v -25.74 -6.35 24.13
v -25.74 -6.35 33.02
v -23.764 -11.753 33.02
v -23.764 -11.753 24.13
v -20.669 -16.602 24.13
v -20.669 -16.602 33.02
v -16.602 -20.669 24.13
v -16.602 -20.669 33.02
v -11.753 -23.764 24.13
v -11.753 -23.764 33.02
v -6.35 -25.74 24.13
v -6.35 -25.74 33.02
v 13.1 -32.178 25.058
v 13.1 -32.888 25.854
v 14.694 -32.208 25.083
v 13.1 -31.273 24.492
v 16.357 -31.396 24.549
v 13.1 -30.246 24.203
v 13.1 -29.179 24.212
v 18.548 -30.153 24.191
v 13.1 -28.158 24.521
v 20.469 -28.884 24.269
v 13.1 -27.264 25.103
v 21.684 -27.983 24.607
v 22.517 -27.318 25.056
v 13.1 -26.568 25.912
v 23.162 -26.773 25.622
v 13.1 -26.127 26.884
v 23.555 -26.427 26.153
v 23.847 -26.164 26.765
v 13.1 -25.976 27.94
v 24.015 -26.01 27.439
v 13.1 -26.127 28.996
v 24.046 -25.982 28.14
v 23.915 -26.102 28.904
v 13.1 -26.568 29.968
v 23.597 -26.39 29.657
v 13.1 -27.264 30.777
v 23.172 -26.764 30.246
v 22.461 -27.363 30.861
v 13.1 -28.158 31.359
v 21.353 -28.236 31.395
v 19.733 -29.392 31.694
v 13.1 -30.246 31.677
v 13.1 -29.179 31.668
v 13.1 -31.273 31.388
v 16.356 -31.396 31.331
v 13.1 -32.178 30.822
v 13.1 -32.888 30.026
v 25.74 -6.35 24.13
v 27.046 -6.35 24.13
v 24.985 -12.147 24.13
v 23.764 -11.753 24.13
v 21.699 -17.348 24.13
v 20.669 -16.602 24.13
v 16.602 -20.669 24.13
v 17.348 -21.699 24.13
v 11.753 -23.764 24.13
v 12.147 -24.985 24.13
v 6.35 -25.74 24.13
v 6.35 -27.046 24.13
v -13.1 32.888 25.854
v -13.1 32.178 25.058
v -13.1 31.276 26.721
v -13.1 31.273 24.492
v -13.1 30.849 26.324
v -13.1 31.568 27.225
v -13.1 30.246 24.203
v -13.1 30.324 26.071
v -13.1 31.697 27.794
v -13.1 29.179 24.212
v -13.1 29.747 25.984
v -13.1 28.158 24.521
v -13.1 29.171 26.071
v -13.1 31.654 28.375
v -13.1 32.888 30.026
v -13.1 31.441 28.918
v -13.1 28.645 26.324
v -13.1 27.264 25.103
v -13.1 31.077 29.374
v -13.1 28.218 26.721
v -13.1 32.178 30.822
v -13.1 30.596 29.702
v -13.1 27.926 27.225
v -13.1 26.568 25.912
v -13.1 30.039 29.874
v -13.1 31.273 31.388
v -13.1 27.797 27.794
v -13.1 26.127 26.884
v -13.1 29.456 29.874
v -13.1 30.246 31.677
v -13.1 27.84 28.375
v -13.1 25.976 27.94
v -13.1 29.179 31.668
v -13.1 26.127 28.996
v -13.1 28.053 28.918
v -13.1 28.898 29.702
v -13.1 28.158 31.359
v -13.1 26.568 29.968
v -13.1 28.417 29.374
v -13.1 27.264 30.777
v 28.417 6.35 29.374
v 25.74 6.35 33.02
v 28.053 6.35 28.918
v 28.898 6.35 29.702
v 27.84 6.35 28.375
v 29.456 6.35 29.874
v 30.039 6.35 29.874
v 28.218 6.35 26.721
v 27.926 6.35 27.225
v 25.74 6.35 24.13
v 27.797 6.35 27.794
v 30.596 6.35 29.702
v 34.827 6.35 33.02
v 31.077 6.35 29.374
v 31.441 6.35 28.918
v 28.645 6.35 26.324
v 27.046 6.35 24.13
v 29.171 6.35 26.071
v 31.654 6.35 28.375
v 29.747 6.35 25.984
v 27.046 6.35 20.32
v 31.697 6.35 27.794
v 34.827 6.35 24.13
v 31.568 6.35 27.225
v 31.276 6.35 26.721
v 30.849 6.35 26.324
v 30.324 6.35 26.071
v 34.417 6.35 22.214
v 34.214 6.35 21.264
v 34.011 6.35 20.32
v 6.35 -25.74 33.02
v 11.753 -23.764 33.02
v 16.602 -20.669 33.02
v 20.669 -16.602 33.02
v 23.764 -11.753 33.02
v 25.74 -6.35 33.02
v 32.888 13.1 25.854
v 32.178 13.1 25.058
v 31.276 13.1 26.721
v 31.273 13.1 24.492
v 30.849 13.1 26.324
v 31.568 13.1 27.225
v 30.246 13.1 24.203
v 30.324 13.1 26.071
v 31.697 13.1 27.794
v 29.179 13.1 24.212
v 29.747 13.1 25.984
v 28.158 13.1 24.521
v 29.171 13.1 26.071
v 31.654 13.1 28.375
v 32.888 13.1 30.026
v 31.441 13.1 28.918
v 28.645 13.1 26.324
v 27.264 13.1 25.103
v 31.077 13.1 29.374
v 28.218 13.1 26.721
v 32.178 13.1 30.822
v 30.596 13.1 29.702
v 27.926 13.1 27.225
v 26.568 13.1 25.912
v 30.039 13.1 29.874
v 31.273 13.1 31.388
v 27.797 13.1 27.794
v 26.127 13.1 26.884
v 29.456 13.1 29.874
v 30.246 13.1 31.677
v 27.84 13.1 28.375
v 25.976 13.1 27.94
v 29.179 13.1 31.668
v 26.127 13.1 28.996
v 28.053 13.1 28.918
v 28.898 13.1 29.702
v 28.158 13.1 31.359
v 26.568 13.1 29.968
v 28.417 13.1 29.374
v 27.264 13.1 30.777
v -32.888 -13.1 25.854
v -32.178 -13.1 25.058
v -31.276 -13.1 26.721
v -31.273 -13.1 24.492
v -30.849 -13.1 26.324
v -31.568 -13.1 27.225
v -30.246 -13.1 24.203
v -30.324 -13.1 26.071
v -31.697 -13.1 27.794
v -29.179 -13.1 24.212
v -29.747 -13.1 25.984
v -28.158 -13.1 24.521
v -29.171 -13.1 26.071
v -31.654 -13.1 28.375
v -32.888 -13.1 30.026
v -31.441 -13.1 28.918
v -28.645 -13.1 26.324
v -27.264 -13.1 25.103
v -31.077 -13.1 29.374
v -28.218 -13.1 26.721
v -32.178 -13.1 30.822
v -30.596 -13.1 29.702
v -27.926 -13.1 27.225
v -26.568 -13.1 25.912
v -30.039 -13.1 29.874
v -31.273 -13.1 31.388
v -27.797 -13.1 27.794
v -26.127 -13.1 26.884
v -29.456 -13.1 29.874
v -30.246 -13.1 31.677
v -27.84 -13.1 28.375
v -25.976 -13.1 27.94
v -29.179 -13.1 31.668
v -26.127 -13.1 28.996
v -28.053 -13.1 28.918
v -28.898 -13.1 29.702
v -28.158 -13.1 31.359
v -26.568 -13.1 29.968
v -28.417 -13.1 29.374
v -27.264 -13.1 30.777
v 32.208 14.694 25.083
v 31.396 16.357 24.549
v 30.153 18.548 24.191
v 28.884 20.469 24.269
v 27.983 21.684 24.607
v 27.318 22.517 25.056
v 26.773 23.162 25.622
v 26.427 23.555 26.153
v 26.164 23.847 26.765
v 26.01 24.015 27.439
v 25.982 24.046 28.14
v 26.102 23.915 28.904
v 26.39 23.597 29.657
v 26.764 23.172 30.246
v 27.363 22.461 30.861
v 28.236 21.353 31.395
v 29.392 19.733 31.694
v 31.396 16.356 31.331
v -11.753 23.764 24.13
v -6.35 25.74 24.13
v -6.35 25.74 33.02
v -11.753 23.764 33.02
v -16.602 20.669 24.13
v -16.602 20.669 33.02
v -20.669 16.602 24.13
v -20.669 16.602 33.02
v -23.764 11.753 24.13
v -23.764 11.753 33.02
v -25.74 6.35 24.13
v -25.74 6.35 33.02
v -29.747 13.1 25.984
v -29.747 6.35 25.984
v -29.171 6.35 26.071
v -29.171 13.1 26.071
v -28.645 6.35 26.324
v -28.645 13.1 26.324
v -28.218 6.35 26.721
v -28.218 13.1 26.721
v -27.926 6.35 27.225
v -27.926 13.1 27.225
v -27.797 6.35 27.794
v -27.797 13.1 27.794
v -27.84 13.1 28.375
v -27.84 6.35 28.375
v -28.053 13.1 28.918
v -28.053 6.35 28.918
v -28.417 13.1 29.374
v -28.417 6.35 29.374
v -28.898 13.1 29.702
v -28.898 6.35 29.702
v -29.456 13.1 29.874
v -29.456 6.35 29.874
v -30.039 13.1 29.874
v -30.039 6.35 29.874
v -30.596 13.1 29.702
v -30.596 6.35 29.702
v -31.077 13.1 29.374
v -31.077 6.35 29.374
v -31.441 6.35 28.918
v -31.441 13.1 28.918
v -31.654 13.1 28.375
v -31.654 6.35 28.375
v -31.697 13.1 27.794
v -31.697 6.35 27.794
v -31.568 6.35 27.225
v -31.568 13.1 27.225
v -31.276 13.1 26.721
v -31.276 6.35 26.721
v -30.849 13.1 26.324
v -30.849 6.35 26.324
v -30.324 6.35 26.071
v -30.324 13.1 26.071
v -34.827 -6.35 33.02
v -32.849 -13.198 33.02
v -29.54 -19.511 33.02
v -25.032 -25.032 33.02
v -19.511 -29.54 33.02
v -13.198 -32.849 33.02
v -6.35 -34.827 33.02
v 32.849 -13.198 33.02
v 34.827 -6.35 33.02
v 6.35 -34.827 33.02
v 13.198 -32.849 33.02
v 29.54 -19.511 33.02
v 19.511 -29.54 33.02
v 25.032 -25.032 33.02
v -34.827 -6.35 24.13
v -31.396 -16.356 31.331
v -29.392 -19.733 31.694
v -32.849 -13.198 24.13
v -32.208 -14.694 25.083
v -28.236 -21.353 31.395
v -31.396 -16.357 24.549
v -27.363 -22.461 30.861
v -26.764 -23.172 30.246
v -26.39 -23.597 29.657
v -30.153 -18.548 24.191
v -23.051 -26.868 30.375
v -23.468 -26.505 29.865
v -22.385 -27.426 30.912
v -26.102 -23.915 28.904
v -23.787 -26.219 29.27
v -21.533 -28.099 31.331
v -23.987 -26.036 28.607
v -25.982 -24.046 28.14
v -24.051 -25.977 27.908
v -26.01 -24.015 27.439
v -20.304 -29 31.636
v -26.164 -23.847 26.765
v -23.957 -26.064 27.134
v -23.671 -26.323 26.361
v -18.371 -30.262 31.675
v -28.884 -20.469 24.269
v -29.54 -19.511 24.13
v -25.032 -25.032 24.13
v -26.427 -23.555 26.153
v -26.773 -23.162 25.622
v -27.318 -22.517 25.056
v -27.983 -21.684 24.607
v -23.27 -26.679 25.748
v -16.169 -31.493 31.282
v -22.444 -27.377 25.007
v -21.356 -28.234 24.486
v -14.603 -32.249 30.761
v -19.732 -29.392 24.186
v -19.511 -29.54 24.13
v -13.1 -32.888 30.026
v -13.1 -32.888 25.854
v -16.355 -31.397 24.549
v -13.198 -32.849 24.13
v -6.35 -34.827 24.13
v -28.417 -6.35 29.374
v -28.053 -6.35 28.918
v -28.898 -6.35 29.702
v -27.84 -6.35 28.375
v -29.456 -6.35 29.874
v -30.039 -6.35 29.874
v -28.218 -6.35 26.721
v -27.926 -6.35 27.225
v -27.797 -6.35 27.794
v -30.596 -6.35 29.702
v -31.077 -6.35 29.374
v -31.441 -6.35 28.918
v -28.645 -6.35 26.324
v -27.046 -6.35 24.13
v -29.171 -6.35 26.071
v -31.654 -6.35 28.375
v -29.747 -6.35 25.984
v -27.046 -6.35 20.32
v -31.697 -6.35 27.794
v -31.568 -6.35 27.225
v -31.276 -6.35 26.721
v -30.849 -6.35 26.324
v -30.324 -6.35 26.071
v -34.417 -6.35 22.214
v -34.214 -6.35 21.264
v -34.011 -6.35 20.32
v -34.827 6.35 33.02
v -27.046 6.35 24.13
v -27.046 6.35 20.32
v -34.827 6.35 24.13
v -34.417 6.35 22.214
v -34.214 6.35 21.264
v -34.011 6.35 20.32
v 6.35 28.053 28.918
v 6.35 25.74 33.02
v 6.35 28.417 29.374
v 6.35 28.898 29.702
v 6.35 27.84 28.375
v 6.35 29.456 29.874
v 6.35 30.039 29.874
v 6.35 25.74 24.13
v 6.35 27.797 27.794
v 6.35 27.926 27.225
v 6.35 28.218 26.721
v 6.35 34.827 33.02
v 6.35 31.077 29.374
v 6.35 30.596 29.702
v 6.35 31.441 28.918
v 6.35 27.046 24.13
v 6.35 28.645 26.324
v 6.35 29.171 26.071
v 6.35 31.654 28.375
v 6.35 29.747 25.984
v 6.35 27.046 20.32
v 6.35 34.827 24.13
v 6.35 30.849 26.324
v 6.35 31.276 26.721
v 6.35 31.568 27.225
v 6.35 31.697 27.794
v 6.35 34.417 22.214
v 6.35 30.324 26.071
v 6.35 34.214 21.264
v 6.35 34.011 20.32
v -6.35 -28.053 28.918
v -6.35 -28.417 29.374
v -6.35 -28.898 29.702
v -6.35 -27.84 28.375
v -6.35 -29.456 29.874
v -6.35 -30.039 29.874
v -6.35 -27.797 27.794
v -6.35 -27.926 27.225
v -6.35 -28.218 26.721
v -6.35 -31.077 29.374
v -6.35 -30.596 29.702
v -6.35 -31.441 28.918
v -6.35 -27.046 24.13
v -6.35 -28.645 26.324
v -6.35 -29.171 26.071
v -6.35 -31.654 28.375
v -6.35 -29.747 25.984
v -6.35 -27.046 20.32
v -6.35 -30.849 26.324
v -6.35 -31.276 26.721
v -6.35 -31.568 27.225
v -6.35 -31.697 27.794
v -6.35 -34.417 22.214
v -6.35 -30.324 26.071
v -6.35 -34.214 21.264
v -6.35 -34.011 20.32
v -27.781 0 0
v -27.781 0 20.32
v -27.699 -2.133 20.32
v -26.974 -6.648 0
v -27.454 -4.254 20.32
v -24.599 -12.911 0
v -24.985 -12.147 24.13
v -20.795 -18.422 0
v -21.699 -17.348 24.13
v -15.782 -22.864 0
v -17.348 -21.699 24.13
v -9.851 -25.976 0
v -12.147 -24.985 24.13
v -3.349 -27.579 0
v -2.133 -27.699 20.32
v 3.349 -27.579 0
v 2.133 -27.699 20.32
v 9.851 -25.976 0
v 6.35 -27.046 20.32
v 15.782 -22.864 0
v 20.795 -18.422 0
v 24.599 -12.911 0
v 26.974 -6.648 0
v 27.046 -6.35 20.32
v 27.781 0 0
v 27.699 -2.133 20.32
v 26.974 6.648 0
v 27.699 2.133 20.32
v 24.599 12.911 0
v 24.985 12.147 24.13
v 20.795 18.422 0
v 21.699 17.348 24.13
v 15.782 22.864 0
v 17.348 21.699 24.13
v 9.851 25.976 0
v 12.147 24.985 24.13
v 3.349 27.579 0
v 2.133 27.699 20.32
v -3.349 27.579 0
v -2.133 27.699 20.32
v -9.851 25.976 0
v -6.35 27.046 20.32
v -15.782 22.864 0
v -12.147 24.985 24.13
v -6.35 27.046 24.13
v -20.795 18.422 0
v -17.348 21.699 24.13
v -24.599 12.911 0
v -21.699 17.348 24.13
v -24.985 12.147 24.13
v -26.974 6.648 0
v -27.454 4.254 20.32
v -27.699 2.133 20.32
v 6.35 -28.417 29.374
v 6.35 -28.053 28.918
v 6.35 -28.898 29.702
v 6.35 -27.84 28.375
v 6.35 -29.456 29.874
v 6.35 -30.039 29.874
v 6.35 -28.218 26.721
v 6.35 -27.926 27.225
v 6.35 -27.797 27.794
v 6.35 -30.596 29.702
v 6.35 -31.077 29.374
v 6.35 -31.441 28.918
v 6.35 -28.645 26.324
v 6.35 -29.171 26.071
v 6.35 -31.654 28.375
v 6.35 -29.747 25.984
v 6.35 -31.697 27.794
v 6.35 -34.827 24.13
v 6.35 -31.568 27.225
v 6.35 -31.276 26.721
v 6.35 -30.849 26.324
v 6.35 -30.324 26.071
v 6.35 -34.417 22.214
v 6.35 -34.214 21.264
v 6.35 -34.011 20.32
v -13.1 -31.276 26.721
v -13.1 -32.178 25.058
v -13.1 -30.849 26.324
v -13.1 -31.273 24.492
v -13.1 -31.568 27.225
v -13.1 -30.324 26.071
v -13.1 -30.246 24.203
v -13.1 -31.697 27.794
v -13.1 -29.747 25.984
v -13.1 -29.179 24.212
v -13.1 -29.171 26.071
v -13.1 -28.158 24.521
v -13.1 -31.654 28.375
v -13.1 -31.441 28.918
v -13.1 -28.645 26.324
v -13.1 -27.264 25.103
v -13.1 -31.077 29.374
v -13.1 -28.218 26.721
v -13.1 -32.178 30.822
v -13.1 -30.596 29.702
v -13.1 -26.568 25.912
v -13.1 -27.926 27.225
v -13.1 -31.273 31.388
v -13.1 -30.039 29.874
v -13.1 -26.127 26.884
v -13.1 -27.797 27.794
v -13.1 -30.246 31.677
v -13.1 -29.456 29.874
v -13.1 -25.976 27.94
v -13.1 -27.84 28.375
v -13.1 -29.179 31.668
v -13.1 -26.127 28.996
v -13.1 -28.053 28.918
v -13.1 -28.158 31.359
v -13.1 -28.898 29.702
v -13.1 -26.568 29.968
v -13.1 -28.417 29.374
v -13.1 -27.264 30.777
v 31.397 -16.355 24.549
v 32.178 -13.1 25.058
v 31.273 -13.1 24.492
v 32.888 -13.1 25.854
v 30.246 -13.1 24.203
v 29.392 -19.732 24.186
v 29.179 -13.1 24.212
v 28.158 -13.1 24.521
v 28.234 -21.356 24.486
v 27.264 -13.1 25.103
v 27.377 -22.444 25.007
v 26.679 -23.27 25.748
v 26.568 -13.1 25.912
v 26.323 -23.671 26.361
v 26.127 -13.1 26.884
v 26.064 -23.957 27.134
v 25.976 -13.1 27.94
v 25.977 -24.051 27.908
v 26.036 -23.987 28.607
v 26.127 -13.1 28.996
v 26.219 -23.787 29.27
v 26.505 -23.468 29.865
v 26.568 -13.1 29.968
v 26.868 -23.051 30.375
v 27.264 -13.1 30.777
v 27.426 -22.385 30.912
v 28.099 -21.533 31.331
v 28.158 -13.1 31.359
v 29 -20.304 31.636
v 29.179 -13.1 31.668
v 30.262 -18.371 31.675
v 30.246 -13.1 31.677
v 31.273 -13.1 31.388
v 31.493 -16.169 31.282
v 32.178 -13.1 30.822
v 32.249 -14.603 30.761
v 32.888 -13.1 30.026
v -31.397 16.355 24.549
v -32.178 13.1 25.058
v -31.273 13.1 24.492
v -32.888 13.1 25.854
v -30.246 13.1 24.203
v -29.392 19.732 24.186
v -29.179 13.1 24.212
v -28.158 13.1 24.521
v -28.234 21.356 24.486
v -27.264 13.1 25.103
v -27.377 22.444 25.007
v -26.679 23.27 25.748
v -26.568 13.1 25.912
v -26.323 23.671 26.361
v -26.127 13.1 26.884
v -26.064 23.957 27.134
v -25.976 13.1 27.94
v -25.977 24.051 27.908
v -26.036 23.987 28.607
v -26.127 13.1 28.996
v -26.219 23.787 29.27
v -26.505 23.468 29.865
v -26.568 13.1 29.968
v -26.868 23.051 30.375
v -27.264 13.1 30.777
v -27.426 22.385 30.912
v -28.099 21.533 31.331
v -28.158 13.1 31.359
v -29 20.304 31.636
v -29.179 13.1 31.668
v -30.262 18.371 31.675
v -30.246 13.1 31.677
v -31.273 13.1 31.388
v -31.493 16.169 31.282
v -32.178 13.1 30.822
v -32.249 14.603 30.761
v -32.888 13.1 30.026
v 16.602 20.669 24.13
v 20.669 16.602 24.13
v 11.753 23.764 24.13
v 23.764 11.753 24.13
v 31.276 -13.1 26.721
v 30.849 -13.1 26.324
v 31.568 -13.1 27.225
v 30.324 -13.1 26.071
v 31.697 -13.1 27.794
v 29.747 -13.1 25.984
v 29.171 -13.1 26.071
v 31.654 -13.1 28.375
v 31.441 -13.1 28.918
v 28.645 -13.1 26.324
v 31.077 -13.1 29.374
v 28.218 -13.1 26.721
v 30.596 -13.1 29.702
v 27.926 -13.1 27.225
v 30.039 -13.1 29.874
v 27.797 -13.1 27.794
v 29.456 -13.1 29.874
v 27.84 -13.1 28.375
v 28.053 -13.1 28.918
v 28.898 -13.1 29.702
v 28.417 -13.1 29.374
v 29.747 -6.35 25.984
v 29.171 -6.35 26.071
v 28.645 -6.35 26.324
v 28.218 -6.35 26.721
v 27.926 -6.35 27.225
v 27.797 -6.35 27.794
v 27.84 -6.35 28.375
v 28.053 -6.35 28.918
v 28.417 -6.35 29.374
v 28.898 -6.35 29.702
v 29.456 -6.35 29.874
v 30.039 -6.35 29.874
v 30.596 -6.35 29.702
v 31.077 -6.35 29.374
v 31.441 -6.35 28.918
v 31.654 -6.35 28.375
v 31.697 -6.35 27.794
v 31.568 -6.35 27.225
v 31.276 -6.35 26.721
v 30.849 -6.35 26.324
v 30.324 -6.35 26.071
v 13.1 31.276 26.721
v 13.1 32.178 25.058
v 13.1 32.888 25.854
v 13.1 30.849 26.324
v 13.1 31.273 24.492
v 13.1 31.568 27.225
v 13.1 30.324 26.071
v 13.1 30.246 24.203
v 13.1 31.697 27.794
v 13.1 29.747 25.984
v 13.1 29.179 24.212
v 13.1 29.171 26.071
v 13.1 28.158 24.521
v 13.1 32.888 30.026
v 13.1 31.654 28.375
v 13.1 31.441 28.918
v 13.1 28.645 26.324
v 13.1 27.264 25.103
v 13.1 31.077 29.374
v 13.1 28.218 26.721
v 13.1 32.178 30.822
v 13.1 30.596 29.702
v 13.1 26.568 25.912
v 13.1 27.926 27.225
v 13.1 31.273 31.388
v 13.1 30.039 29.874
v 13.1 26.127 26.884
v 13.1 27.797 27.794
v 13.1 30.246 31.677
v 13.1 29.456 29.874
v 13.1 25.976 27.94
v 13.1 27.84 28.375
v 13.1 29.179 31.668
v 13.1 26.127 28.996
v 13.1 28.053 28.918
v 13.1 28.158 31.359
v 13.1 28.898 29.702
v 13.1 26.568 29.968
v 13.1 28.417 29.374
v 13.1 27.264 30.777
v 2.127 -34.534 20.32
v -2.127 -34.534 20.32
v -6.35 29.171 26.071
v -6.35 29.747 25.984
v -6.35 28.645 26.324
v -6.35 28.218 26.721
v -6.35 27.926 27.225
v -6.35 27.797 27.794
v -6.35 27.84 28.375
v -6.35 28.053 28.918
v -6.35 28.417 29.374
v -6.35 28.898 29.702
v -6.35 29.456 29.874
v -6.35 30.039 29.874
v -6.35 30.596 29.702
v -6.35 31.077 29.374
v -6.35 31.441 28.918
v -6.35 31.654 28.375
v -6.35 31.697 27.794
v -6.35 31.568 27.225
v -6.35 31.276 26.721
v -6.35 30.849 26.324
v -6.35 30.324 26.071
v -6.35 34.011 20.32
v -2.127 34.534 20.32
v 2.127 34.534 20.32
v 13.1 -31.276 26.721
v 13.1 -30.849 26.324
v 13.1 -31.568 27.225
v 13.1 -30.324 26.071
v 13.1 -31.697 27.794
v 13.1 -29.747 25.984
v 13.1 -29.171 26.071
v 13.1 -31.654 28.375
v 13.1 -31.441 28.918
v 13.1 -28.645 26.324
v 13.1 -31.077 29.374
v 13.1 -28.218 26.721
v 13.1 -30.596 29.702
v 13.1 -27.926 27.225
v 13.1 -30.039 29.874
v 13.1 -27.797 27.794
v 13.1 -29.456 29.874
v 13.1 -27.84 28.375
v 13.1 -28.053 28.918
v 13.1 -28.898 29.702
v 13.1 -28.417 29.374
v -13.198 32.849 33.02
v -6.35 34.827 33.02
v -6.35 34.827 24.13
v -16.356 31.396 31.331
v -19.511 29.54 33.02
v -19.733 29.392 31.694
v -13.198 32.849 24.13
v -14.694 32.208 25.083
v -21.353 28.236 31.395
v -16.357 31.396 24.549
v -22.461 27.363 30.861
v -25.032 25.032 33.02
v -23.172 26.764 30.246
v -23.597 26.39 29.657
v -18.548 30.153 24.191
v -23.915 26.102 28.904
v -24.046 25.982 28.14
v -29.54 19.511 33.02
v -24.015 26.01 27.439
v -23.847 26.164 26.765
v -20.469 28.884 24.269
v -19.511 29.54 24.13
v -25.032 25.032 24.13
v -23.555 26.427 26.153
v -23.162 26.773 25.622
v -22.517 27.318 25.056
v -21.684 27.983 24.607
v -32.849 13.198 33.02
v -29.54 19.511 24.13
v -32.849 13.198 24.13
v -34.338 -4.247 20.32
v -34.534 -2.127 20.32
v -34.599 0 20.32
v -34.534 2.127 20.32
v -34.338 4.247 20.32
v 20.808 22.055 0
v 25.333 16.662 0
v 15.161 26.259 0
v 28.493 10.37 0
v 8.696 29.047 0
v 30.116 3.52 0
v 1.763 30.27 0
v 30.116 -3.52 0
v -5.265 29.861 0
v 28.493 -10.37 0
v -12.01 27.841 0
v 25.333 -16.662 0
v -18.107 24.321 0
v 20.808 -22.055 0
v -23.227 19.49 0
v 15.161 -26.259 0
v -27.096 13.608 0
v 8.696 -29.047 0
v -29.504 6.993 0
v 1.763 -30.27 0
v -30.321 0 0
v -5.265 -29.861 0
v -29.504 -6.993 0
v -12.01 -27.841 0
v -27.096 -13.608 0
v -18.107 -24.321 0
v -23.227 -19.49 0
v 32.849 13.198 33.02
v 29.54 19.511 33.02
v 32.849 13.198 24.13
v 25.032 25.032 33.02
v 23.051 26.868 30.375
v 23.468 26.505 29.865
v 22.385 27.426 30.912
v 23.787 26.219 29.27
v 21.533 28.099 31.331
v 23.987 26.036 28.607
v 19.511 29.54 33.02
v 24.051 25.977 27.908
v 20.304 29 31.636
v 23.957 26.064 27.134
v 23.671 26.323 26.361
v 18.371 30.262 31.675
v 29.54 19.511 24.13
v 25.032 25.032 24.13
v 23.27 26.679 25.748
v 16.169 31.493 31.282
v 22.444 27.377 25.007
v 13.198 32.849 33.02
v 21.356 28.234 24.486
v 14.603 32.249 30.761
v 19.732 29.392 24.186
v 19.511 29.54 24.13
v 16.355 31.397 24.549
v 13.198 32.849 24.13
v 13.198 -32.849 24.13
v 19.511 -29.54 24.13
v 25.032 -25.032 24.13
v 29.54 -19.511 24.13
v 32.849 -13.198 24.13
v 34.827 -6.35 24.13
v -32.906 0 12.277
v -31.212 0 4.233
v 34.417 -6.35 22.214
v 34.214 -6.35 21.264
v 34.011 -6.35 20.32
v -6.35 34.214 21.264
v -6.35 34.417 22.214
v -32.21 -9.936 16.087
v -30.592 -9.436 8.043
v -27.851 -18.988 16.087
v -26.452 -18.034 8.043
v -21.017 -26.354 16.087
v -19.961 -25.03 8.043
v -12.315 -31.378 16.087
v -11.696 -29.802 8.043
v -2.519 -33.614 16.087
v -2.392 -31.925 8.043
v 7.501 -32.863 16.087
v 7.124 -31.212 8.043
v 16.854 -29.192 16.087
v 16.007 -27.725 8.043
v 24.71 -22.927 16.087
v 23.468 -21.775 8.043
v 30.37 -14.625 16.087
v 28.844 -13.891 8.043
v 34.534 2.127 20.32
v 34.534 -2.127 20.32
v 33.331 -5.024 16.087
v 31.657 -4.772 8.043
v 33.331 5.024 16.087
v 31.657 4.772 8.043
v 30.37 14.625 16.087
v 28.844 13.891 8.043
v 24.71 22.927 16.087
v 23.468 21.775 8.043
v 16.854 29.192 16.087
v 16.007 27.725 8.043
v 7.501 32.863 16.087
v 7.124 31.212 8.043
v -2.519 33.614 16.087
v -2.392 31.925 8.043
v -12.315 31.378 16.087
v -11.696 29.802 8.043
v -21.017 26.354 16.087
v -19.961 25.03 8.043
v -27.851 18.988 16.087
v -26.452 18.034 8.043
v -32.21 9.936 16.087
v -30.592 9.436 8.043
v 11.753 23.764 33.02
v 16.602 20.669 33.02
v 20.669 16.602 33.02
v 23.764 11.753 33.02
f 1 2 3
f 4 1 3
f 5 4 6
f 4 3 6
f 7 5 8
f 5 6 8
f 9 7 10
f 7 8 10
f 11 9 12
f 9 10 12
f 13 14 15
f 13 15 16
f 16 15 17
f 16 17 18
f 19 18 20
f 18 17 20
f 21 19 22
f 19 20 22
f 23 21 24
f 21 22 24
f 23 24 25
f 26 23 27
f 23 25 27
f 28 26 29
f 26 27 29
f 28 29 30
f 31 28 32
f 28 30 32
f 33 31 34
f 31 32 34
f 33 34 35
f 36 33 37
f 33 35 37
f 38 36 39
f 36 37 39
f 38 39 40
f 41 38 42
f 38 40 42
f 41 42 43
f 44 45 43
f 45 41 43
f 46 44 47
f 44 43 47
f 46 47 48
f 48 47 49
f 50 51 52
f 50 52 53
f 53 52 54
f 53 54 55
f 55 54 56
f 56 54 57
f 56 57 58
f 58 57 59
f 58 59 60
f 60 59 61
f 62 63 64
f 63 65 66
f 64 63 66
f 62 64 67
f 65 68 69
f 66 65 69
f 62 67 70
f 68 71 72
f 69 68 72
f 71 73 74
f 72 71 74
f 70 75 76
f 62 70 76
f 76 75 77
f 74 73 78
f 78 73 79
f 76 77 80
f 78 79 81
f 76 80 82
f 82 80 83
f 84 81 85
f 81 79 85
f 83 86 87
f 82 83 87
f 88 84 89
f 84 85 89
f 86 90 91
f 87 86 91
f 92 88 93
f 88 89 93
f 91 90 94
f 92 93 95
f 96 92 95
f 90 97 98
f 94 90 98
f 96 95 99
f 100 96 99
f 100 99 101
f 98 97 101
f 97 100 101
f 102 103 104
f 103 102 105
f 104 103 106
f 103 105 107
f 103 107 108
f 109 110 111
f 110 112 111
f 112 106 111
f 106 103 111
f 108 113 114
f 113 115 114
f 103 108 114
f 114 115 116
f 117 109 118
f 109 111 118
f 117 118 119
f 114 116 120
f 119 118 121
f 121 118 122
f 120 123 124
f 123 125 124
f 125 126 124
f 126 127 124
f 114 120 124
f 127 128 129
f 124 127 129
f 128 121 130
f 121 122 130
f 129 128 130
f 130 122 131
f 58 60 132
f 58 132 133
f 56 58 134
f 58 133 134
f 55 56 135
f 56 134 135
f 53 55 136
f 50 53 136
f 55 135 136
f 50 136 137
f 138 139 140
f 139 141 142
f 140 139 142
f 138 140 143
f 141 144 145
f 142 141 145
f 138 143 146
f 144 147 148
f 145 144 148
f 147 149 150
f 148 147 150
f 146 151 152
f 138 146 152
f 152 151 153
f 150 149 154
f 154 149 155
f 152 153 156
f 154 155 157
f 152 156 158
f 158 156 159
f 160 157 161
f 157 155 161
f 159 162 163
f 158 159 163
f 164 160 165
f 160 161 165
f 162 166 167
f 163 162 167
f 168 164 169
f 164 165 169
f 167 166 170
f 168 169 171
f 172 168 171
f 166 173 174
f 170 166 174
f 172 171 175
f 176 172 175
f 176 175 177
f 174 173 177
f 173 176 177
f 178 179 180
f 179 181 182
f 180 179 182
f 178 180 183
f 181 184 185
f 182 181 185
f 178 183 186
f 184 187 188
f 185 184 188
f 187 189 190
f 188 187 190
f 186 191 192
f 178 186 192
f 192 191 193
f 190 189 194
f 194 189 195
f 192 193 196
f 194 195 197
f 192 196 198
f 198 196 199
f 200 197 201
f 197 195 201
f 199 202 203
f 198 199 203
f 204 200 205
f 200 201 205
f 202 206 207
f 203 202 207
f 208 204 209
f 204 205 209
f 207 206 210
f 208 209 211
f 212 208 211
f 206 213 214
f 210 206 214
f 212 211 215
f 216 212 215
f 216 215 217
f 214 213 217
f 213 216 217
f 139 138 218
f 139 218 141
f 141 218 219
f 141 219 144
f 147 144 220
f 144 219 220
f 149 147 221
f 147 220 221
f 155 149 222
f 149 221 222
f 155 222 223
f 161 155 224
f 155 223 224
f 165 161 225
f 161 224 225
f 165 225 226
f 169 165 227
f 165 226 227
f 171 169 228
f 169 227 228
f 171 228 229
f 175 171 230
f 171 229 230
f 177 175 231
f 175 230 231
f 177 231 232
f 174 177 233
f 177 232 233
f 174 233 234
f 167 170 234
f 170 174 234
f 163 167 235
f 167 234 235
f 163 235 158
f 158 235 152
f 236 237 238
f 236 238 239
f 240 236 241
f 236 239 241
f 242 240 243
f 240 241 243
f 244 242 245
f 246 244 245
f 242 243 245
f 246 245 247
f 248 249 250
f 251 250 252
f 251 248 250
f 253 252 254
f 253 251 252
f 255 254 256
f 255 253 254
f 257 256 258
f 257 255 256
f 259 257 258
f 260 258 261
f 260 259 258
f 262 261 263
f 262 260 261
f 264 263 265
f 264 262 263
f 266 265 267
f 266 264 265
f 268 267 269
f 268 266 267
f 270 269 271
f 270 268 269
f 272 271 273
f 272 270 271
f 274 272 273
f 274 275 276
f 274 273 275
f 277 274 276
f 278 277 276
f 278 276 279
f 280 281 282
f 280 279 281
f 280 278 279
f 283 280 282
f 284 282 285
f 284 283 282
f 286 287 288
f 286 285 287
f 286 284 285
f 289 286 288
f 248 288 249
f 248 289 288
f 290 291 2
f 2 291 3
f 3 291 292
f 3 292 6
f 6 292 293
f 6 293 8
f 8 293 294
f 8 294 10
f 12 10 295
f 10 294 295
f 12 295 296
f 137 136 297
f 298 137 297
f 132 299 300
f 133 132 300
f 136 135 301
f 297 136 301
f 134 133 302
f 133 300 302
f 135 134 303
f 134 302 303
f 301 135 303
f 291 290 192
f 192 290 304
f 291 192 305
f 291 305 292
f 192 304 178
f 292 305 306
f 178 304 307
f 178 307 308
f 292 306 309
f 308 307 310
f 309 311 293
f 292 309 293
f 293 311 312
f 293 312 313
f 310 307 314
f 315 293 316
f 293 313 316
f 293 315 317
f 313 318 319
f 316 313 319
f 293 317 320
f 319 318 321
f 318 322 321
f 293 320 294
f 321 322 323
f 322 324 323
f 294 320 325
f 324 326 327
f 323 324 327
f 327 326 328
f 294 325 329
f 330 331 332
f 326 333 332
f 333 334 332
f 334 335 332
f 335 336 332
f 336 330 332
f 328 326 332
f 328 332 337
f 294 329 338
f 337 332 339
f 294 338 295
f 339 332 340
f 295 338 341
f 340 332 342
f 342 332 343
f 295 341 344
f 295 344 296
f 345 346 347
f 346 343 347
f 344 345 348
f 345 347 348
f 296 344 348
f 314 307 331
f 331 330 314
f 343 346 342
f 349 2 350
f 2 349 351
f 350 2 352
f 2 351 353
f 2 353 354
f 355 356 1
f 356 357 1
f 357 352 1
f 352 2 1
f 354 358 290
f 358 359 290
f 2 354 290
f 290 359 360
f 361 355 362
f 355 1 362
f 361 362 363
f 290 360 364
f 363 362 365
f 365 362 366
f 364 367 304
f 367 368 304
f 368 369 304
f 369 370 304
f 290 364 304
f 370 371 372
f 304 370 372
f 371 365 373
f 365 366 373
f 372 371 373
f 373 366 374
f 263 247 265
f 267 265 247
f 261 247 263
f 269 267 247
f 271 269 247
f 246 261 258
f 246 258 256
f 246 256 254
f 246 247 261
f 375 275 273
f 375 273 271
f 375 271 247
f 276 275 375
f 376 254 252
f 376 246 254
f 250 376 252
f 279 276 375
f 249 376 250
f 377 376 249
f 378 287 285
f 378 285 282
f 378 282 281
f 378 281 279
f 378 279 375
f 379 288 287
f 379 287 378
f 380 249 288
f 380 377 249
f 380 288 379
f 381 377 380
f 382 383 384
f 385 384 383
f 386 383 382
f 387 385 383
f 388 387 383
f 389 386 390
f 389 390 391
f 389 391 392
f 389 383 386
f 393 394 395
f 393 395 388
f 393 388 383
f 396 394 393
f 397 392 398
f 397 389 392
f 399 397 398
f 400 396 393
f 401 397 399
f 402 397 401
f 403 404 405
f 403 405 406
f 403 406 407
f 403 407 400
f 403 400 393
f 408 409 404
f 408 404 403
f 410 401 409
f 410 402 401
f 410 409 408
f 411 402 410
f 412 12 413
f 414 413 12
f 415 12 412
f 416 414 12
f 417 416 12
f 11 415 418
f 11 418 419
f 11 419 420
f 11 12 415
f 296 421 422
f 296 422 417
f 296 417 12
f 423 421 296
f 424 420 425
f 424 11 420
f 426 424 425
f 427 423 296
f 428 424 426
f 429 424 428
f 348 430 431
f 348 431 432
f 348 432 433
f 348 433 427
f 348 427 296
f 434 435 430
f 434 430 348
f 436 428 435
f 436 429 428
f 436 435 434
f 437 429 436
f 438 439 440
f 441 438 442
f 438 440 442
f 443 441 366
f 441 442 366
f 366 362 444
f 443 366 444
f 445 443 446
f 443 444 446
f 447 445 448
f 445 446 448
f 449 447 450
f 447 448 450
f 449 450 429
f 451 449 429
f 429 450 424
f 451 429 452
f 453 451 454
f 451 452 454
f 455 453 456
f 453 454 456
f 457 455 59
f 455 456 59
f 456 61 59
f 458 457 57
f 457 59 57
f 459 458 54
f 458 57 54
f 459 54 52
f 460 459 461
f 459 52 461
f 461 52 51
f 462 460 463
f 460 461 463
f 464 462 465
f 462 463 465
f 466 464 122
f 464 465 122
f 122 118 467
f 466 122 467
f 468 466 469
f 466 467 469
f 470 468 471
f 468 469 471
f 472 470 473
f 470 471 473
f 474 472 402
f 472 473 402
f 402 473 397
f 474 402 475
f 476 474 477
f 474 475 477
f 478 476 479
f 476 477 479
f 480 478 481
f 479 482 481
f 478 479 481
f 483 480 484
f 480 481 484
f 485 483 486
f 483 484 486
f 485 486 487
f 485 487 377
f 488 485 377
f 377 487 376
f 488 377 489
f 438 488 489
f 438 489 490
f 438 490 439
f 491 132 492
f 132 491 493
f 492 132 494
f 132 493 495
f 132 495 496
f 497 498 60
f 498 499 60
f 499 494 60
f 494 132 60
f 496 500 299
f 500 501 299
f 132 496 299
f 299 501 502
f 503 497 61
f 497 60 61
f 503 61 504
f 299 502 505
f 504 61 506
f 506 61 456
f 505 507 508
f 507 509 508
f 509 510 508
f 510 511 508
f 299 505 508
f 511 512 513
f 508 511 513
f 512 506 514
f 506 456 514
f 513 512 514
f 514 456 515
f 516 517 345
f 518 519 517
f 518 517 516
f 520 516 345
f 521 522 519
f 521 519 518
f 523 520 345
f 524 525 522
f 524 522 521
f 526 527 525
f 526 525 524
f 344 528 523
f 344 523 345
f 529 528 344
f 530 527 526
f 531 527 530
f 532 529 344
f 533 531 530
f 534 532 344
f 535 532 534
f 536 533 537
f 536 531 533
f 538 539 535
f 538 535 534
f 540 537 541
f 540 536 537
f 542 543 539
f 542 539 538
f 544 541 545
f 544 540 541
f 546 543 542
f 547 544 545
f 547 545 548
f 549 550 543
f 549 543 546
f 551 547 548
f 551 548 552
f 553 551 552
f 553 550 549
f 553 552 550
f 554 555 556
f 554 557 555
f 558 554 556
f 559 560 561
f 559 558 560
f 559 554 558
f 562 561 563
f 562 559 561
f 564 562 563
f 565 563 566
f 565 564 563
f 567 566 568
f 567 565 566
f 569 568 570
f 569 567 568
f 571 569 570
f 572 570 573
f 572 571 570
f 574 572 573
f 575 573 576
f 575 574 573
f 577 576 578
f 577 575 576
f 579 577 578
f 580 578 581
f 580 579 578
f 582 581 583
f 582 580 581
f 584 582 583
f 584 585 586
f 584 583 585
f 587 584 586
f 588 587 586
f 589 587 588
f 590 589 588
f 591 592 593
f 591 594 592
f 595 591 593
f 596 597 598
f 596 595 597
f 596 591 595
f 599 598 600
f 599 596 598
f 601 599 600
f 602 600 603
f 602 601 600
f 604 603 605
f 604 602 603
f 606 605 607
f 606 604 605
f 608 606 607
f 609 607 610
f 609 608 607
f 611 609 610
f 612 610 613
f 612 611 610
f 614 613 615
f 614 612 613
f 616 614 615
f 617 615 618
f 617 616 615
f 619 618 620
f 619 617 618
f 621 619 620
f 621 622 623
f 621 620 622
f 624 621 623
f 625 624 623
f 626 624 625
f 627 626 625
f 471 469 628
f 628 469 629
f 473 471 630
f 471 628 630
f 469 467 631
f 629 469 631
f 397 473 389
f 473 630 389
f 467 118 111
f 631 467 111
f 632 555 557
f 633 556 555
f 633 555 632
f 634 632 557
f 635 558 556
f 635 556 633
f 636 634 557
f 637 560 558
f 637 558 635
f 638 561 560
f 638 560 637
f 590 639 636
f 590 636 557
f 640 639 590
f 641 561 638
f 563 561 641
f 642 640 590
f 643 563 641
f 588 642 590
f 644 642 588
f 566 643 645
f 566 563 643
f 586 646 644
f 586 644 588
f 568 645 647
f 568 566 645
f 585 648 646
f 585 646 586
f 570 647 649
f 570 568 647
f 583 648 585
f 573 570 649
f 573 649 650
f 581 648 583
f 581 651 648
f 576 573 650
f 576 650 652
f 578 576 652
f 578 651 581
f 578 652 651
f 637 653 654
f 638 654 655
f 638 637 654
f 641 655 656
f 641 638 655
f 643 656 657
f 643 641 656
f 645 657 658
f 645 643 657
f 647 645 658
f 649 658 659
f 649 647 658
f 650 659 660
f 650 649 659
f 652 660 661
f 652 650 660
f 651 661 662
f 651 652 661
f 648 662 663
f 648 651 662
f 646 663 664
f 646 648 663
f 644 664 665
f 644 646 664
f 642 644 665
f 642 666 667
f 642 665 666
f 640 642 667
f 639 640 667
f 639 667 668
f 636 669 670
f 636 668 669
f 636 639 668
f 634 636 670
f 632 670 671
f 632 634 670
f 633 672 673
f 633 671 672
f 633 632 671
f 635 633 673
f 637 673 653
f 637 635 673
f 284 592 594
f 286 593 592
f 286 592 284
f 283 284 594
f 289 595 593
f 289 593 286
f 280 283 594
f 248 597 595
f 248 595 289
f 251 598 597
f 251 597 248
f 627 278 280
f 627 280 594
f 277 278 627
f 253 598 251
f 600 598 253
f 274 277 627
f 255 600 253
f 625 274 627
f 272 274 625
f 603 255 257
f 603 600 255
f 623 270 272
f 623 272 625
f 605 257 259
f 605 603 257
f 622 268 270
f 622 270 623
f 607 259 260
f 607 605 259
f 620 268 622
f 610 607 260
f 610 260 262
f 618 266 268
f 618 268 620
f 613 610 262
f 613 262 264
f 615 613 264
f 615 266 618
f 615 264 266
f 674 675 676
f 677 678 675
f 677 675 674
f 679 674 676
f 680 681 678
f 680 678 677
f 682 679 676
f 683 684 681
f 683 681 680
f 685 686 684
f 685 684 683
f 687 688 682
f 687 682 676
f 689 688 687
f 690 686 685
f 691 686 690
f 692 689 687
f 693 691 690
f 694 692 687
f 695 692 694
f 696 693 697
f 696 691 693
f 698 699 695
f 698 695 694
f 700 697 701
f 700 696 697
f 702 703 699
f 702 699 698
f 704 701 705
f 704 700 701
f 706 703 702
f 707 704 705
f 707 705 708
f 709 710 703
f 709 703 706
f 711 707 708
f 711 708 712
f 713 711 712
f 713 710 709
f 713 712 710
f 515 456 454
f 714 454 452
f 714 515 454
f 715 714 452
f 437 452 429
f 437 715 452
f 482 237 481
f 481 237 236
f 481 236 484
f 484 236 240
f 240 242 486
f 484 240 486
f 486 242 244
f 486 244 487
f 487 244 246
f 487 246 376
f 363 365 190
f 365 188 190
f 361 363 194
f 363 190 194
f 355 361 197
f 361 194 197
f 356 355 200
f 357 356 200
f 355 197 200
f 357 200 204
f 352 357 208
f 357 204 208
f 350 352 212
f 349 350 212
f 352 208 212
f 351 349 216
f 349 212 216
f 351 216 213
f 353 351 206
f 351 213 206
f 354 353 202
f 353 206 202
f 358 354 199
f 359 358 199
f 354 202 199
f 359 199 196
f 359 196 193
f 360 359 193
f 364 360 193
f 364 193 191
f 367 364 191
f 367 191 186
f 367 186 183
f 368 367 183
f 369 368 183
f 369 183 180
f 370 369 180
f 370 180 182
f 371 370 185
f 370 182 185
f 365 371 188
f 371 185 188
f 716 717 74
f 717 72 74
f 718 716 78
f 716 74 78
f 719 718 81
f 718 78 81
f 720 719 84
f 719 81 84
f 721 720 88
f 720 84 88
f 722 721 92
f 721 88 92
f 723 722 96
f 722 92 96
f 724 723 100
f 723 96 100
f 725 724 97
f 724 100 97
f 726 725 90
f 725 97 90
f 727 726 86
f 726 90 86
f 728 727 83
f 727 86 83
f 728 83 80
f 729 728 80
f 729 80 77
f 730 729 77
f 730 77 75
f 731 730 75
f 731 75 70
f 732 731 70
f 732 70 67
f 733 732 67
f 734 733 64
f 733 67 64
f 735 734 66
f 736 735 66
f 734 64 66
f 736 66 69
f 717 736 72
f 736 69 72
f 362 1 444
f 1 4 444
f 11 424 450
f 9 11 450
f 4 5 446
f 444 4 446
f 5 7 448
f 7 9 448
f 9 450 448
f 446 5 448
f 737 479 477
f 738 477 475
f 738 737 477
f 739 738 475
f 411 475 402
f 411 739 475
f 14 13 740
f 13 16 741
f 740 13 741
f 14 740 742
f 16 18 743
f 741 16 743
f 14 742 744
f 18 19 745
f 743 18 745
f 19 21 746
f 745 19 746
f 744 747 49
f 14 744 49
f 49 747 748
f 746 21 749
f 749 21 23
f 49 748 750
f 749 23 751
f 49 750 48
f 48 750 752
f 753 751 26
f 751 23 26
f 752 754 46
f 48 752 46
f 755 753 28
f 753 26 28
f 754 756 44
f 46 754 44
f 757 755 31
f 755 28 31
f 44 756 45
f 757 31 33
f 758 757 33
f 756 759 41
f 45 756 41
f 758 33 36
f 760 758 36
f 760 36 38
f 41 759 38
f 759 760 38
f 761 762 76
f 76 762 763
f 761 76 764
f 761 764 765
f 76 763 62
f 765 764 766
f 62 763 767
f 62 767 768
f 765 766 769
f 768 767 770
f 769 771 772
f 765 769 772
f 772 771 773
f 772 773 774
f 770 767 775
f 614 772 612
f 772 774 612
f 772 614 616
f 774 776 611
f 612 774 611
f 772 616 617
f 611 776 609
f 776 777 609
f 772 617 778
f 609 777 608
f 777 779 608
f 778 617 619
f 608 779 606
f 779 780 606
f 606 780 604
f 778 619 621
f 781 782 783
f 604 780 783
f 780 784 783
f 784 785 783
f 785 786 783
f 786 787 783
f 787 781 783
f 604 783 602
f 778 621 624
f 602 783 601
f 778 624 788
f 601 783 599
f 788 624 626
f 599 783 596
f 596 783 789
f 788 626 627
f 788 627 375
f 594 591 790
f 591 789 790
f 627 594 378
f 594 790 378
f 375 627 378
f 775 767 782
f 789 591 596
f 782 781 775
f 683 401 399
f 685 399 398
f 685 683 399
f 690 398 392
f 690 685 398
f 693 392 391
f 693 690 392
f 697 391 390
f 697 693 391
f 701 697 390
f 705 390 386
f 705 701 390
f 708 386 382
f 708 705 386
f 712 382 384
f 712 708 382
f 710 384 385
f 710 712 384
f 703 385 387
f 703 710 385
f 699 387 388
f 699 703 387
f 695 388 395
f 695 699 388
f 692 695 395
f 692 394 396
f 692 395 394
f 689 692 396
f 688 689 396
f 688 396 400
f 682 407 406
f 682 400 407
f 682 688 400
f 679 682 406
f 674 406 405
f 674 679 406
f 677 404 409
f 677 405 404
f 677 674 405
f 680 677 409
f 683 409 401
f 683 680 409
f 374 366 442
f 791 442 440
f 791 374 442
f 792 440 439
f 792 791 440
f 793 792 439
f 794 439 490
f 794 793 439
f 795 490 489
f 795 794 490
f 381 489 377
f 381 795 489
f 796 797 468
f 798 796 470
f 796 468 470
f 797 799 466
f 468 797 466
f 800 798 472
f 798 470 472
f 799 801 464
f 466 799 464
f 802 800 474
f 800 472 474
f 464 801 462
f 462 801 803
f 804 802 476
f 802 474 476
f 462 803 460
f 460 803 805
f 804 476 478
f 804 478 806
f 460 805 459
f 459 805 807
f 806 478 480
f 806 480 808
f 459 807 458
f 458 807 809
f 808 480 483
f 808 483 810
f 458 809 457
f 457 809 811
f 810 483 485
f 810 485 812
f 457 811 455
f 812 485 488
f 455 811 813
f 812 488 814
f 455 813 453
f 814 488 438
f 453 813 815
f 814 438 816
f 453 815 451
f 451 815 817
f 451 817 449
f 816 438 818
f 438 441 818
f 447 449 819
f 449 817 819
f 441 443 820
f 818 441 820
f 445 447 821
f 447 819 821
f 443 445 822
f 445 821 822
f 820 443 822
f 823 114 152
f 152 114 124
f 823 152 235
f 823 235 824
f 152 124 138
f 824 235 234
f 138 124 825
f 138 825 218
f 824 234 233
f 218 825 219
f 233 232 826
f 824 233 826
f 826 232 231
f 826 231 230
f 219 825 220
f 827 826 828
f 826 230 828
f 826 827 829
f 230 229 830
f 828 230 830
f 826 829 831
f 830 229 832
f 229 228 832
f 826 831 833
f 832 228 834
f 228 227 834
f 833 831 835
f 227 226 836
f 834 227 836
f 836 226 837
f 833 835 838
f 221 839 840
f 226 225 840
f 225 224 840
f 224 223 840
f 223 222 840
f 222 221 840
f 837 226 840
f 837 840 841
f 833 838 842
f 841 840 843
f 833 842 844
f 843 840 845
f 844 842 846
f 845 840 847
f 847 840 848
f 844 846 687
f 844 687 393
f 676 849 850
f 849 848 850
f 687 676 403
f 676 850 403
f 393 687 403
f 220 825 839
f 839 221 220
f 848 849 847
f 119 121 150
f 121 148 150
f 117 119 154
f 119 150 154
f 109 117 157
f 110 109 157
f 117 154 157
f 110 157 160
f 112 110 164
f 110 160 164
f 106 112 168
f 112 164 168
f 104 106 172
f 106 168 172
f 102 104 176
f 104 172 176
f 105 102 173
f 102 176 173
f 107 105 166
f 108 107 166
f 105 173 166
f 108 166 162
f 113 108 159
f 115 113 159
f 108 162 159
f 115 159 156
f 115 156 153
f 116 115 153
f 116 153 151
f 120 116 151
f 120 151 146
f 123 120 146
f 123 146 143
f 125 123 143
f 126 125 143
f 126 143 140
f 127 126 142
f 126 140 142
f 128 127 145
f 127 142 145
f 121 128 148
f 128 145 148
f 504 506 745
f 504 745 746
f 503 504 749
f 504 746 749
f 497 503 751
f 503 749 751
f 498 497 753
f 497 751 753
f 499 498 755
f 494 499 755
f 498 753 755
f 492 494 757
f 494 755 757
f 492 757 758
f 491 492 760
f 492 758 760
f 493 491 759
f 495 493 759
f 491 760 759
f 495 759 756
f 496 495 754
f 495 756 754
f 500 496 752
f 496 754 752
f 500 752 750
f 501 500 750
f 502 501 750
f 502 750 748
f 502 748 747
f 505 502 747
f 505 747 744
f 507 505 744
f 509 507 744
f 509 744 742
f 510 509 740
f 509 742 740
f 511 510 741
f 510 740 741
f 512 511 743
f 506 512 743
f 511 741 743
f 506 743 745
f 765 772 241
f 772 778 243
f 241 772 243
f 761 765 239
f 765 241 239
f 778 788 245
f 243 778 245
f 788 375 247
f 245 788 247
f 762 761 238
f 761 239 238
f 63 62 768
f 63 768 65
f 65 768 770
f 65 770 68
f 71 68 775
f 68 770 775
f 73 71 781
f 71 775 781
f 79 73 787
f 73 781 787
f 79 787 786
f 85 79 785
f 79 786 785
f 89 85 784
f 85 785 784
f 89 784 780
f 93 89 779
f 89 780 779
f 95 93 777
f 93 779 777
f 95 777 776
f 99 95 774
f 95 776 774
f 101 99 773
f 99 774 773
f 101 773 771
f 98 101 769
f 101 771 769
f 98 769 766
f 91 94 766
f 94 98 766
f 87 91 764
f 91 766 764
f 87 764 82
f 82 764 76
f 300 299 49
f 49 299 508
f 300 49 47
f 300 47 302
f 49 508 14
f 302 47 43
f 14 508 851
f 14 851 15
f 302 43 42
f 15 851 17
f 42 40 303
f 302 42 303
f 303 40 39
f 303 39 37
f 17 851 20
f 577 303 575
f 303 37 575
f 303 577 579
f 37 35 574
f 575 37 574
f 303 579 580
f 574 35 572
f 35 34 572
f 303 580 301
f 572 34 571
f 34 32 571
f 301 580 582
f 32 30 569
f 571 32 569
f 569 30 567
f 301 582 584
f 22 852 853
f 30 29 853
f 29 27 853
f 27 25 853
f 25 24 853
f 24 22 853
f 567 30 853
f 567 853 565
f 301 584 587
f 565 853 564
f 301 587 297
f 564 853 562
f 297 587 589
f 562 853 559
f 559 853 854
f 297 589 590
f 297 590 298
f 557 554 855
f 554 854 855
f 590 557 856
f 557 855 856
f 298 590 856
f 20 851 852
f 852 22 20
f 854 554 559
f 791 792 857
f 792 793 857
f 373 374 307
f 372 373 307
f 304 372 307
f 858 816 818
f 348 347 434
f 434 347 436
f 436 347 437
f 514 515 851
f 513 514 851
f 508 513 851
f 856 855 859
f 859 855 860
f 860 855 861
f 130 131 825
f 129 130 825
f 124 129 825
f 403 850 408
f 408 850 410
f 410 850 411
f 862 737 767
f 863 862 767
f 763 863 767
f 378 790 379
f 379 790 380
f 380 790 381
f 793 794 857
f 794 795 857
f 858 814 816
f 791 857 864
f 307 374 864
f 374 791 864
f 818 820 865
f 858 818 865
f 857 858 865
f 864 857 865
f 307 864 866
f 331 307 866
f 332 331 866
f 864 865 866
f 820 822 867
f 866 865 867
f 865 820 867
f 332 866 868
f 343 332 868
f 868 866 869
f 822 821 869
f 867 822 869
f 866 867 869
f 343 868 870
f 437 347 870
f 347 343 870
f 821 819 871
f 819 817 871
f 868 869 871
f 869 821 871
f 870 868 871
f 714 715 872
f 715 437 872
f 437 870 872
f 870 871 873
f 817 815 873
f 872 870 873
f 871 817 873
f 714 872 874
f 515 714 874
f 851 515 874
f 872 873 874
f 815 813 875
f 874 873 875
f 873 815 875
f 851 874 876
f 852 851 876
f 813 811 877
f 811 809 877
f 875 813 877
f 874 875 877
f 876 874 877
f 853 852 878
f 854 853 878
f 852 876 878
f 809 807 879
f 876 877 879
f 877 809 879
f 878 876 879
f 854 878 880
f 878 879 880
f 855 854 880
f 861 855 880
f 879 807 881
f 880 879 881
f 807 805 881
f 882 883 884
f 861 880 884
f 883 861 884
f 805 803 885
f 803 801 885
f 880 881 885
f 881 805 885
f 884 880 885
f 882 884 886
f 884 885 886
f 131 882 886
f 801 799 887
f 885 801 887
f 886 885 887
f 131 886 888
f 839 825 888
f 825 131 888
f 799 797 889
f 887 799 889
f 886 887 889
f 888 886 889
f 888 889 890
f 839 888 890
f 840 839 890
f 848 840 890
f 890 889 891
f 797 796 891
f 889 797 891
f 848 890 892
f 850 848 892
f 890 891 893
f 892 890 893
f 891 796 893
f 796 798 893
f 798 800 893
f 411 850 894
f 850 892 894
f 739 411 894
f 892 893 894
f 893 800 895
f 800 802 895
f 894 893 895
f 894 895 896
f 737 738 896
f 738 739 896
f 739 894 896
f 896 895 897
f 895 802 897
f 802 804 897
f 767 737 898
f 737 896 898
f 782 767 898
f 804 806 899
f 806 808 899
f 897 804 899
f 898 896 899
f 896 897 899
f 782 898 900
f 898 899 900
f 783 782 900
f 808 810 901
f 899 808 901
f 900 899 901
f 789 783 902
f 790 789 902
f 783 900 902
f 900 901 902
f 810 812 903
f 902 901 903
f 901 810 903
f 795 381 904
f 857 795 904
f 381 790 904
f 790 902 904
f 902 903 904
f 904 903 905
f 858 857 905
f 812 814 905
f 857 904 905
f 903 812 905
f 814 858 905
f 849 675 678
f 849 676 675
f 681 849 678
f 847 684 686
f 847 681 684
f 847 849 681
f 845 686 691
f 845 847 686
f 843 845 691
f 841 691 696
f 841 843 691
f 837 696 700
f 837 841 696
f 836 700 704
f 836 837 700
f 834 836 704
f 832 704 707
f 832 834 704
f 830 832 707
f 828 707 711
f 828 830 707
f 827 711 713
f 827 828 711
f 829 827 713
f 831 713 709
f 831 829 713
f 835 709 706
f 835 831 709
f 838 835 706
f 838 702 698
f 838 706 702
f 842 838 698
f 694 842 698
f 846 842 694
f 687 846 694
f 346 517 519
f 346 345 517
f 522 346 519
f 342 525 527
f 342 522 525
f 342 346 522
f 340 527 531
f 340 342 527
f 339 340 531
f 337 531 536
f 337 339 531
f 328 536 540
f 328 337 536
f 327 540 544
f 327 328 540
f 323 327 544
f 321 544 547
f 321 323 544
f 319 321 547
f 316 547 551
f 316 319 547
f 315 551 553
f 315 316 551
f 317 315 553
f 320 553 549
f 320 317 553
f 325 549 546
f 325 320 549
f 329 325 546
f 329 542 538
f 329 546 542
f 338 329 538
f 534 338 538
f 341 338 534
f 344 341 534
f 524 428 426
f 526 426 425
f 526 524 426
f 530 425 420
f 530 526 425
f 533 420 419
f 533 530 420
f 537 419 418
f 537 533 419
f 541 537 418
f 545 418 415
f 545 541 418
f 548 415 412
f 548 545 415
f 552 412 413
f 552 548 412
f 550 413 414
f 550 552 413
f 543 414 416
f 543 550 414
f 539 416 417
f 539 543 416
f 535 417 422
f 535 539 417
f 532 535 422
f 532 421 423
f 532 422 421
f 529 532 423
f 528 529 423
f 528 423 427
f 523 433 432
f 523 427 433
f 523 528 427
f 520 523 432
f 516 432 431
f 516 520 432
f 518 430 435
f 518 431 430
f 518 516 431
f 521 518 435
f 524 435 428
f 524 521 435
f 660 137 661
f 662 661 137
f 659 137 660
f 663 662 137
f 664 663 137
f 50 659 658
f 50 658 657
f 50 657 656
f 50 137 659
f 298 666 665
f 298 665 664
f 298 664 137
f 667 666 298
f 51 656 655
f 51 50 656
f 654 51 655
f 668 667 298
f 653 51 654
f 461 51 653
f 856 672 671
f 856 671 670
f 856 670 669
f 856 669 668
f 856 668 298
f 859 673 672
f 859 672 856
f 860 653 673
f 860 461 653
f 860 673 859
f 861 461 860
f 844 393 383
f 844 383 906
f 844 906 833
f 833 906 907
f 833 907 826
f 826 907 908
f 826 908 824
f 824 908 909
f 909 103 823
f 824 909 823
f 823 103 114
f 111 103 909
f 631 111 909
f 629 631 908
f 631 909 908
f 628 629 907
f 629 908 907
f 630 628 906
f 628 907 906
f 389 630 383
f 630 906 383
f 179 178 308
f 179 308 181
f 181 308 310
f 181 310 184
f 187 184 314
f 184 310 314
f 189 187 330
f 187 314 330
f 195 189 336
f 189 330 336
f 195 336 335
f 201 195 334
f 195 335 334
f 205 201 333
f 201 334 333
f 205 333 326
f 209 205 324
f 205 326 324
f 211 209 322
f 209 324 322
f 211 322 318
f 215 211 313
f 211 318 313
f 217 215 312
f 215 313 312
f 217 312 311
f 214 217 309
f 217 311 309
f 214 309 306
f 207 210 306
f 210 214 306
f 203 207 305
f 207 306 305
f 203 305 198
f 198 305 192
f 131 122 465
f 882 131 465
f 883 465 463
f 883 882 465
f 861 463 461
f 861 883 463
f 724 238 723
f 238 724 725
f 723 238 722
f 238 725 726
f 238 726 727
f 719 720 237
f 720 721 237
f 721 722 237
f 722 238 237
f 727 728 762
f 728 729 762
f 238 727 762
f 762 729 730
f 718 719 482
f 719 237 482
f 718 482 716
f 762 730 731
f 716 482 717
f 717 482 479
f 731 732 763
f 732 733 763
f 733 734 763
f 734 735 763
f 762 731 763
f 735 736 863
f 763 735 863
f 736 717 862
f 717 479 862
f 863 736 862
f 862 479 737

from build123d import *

# Parameters (mm, degrees)
CUT_EXTRUDE2_START = -12.7
SKETCH5_W          = 12.7
SKETCH5_H          = 12.7
CUT_EXTRUDE2_DEPTH = 73.673472495
CIRPATTERN1_COUNT  = 4


with BuildPart() as part:
    # Sketch1 → base_ring (revolve)
    with BuildSketch(Plane.YZ, mode=Mode.PRIVATE) as base_ring_sk:
        Polygon((27.78125, 0), (27.78125, 24.13), (26.51125, 24.13), (26.51125, 33.02), (35.40125, 33.02), (35.40125, 24.13), (30.32125, 0), align=None)
    revolve(base_ring_sk.sketch.rotate(Axis((0, 0, 0), (0, 0, 1)), 90), axis=Axis((0, 0, 0), (0, 0, 1)))

    # Sketch5 → Cut-Extrude2 (cut)
    with BuildSketch(Plane.XY.offset(33.02).offset(CUT_EXTRUDE2_START)):
        with Locations((0, 32.089539168)):
            Rectangle(SKETCH5_W, SKETCH5_H)
    cut_extrude2 = extrude(amount=CUT_EXTRUDE2_DEPTH, mode=Mode.SUBTRACT)

    # Sketch8 → pulley_bolt_hole (revolve, cut)
    with BuildSketch(Plane(origin=(35.40125, 29.747087182, 27.94), x_dir=(0, 0, -1), z_dir=(0, 1, 0))):
        Polygon((0, 0), (0, 39.275163199), (1.9558, 38.1), (1.9558, 22.3012), (3.77063, 22.3012), (3.77063, 0), align=None)
    pulley_bolt_hole = revolve(axis=Axis((41.75125, 29.747087182, 27.94), (-1, 0, 0)), mode=Mode.SUBTRACT)

    # bolthole_mirror: pulley_bolt_hole across plane
    add(pulley_bolt_hole.mirror(Plane(origin=(0, 0, 0), x_dir=(0, 0, 1), z_dir=(1, 0, 0))), mode=Mode.SUBTRACT)

    # CirPattern1: Cut-Extrude2, pulley_bolt_hole ×4 about axis
    cirpattern1_axis = Axis((0, 0, 0), (0, 0, 1))
    add([cut_extrude2.rotate(cirpattern1_axis, i * 360 / CIRPATTERN1_COUNT) for i in range(1, CIRPATTERN1_COUNT)], mode=Mode.SUBTRACT)
    add([pulley_bolt_hole.rotate(cirpattern1_axis, i * 360 / CIRPATTERN1_COUNT) for i in range(1, CIRPATTERN1_COUNT)], mode=Mode.SUBTRACT)

    # CirPattern1 copy 1 sketch → CirPattern1 copy 1 (revolve, cut)
    with BuildSketch(Plane(origin=(-29.747087182, -35.40125, 27.94), x_dir=(0, 0, -1), z_dir=(-1, 0, 0))):
        Polygon((0, 0), (0, -39.275163199), (1.9558, -38.1), (1.9558, -22.3012), (3.77063, -22.3012), (3.77063, 0), align=None)
    revolve(axis=Axis((-29.747087182, -41.75125, 27.94), (0, -1, 0)), mode=Mode.SUBTRACT)

    # CirPattern1 copy 2 sketch → CirPattern1 copy 2 (revolve, cut)
    with BuildSketch(Plane(origin=(35.40125, -29.747087182, 27.94), x_dir=(0, 0, -1), z_dir=(0, -1, 0))):
        Polygon((0, 0), (0, -39.275163199), (1.9558, -38.1), (1.9558, -22.3012), (3.77063, -22.3012), (3.77063, 0), align=None)
    revolve(axis=Axis((41.75125, -29.747087182, 27.94), (1, 0, 0)), mode=Mode.SUBTRACT)

    # CirPattern1 copy 3 sketch → CirPattern1 copy 3 (revolve, cut)
    with BuildSketch(Plane(origin=(29.747087182, 35.40125, 27.94), x_dir=(0, 0, -1), z_dir=(1, 0, 0))):
        Polygon((0, 0), (0, -39.275163199), (1.9558, -38.1), (1.9558, -22.3012), (3.77063, -22.3012), (3.77063, 0), align=None)
    revolve(axis=Axis((29.747087182, 41.75125, 27.94), (0, 1, 0)), mode=Mode.SUBTRACT)


solid = part.part
